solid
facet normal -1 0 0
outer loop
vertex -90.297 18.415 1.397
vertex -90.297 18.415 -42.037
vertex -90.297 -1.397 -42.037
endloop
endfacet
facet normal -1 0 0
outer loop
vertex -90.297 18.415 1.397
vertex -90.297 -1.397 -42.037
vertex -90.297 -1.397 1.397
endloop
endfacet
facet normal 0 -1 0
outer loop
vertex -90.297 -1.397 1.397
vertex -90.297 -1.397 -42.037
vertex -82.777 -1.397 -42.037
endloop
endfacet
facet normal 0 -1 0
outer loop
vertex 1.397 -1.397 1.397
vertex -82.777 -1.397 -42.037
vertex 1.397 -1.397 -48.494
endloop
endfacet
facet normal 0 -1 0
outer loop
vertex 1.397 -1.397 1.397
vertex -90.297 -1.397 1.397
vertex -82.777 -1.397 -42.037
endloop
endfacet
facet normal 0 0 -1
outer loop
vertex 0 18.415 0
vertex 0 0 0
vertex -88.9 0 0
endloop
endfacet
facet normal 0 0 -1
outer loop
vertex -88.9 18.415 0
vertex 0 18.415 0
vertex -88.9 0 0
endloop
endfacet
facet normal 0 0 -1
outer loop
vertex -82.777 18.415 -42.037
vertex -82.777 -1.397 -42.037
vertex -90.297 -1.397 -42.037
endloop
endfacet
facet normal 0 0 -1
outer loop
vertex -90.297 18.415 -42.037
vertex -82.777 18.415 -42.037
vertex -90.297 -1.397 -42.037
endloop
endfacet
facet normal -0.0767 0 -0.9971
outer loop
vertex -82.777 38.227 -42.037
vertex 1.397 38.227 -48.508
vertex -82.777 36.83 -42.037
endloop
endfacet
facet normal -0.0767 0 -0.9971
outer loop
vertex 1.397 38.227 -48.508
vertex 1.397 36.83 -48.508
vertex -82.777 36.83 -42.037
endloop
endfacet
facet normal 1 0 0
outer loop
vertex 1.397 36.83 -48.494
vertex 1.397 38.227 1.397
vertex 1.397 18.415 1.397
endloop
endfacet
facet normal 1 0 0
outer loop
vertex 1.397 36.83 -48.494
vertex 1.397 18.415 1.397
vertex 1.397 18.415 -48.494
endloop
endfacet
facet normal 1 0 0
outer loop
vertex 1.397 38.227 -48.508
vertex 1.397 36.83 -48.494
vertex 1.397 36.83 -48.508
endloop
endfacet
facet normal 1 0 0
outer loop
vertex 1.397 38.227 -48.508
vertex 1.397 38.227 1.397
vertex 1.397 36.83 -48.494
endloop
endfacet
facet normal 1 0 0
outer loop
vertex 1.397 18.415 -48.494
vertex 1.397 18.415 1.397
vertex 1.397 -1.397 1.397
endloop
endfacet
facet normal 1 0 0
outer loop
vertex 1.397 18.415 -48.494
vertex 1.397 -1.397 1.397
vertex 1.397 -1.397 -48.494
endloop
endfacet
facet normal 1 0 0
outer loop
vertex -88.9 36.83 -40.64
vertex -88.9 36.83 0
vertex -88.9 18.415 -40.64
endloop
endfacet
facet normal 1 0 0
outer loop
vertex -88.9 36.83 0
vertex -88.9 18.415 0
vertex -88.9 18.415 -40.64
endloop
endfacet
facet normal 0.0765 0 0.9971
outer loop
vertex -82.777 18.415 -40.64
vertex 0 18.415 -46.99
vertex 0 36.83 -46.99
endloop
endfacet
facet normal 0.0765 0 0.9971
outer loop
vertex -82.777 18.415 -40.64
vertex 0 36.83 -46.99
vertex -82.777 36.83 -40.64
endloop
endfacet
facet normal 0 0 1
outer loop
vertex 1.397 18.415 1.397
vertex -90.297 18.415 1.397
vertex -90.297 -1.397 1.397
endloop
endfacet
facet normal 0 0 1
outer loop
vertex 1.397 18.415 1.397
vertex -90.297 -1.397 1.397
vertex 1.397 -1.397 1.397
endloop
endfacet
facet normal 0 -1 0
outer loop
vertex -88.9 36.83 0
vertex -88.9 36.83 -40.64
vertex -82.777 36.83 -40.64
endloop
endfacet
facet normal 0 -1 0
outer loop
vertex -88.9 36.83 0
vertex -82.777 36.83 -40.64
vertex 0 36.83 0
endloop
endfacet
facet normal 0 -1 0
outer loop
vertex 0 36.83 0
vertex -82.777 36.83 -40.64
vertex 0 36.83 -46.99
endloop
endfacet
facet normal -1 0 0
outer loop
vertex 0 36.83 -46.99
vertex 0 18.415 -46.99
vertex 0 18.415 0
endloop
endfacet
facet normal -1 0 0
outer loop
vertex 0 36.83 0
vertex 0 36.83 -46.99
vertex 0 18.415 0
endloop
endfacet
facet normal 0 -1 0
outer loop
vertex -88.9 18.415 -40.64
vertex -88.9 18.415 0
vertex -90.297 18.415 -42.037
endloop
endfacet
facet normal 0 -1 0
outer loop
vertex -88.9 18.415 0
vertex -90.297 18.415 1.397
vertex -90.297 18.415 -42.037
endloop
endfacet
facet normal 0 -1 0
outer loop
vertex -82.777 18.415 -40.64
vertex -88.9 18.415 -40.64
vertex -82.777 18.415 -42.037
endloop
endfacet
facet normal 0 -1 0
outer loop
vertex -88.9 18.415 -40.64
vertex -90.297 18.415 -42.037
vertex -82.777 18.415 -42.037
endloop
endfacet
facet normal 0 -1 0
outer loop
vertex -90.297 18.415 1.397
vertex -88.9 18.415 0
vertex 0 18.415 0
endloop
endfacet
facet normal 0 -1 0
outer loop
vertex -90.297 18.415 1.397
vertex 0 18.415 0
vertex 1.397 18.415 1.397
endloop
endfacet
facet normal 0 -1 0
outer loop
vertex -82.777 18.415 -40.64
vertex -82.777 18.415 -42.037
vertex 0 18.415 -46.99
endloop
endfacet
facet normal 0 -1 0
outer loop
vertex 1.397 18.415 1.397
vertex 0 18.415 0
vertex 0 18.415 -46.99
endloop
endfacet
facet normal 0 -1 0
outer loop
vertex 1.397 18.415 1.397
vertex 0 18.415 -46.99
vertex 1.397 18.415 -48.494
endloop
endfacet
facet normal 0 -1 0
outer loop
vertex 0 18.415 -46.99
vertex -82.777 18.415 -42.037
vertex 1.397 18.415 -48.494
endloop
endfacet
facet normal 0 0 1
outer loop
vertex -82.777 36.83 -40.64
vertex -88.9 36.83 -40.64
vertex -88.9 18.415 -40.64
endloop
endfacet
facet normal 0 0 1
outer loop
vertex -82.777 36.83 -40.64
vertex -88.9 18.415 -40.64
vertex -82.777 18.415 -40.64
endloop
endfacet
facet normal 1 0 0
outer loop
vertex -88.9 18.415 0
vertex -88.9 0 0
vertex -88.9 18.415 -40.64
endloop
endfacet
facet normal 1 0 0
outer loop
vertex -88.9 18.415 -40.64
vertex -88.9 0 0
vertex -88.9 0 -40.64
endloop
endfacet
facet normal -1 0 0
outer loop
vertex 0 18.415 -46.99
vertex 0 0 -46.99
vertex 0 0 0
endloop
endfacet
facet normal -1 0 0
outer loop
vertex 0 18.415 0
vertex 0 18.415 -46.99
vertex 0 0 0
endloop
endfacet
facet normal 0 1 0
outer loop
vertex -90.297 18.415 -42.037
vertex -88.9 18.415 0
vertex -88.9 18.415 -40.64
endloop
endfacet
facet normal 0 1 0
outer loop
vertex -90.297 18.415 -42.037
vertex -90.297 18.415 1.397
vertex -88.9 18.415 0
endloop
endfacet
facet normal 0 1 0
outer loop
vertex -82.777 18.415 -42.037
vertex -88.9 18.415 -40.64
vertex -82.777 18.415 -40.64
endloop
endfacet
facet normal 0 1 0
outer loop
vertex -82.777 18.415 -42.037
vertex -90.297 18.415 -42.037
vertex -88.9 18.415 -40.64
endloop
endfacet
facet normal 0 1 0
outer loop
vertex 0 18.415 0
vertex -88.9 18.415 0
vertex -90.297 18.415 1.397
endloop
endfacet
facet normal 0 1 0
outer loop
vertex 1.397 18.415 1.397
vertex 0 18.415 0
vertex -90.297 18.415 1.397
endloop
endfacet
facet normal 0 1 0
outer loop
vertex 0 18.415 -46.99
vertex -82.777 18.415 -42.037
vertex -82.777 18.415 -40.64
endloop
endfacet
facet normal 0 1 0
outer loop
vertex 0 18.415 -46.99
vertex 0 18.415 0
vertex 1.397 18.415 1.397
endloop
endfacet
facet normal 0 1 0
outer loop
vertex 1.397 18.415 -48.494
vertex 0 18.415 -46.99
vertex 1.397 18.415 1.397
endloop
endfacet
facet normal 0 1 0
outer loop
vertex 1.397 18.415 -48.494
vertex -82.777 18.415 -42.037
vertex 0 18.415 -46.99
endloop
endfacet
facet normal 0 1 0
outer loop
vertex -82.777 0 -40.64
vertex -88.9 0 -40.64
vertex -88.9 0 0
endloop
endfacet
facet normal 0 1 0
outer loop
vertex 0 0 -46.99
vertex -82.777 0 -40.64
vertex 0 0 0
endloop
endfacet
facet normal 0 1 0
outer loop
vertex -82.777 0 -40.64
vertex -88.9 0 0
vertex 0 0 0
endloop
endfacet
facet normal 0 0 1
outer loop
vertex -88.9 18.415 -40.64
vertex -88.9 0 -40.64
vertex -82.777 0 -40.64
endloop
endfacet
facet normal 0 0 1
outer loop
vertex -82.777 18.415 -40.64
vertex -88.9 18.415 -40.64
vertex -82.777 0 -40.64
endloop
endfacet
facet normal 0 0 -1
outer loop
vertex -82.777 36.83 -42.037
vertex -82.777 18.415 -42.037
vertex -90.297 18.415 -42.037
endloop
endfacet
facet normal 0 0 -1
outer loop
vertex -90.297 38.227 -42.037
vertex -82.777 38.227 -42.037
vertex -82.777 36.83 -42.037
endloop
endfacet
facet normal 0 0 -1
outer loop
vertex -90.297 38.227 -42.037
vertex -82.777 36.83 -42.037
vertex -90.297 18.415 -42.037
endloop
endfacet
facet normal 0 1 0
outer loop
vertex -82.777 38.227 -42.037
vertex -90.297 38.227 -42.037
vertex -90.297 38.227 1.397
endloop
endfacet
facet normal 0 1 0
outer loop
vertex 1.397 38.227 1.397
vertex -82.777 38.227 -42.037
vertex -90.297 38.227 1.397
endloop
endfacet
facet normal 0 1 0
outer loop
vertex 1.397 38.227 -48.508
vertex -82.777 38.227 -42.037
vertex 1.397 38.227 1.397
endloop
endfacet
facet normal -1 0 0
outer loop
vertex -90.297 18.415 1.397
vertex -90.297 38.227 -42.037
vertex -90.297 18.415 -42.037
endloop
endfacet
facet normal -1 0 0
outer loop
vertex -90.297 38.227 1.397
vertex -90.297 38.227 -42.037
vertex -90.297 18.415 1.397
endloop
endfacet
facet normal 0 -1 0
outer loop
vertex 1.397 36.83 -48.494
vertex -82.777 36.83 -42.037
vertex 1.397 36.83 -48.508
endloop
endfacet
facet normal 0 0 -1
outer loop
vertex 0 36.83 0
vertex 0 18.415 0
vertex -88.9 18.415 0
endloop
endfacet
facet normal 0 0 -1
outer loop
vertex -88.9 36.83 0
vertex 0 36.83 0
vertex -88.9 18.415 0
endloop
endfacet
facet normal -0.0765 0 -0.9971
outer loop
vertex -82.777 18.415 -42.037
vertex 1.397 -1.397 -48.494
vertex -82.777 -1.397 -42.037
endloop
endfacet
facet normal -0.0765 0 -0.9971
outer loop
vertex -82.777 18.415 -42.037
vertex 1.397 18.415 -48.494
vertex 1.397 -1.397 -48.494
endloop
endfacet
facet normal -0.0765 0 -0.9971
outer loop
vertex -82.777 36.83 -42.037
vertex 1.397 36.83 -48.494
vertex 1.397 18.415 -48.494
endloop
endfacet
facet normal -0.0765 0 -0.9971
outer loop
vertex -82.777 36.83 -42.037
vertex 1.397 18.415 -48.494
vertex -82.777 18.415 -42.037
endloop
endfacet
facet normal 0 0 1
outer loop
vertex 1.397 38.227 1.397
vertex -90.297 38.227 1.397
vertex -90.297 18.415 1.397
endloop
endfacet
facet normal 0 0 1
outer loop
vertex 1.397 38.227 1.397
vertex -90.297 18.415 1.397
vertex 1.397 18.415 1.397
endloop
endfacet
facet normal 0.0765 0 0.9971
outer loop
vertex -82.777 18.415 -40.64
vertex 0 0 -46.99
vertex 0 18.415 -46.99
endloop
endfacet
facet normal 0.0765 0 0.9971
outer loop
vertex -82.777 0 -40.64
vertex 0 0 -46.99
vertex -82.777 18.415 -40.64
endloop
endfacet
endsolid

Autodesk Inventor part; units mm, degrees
ref_plane "YZ Plane" through (0, 0, 0) normal (1, 0, 0) x (0, 1, 0)
ref_plane "XZ Plane" through (0, 0, 0) normal (0, 1, 0) x (-1, 0, 0)
ref_plane "XY Plane" through (0, 0, 0) normal (0, 0, 1) x (1, 0, 0)
sketch "Sketch1" plane through (0, 0, 0) normal (0, 1, 0) x (-1, 0, 0)
  point P0 (0, 0)
sketch "Sketch2" plane through (0, 0, 0) normal (0, 1, 0) x (-1, 0, 0)
  line L0 (0, 0) -> (88.9, 0)
  line L1 (88.9, 0) -> (88.9, -40.64)
  line L2 (88.9, -40.64) -> (82.7769, -40.64)
  line L3 (0, -40.64) -> (0, 0)
  line L4 (0, -40.64) -> (0, -46.99)
  line L5 (0, -46.99) -> (82.7769, -40.64)
  line L6 (88.9, 1.397) -> (0, 1.397)
  line L7 (0, 1.397) -> (-1.397, 1.397)
  line L8 (-1.397, 1.397) -> (-1.397, -42.037)
  line L9 (-1.397, -42.037) -> (-1.397, -47.0972)
  line L10 (-1.397, -47.0972) -> (-1.397, -48.4942)
  line L11 (-1.397, -48.4942) -> (82.7769, -42.037)
  line L12 (82.7769, -42.037) -> (88.9, -42.037)
  line L13 (88.9, -42.037) -> (90.297, -42.037)
  line L14 (90.297, -42.037) -> (90.297, 1.397)
  line L15 (90.297, 1.397) -> (88.9, 1.397)
  dimension "d0" = 88.9
  dimension "d2" = 6.35
  dimension "d6" = 1.397
  dimension "d7" = 43.434
  dimension "d8" = 1.397
  dimension "d9" = 1.397
extrude "Extrusion1" add sketch "Sketch2" along normal blind 36.83
sketch "Sketch3" plane through (0, 36.83, 0) normal (0, 1, 0) x (1, 0, 0)
  point P0 (0, 0)
sketch "Sketch4" plane through (0, 36.83, 0) normal (0, 1, 0) x (1, 0, 0)
  line L0 (-90.297, -1.397) -> (1.397, -1.397) projected
  line L1 (1.397, -1.397) -> (1.397, 48.5083)
  line L2 (-82.7769, 42.037) -> (-90.297, 42.037) projected
  line L3 (1.397, 48.5083) -> (-82.7769, 42.037)
  line L4 (-82.7769, 42.037) -> (-90.297, 42.037)
  line L5 (-90.297, 42.037) -> (-90.297, -1.397) projected
  line L6 (-90.297, 42.037) -> (-90.297, -1.397)
  line L7 (1.397, -1.397) -> (1.397, 48.4942) projected
  line L8 (-90.297, -1.397) -> (1.397, -1.397)
  line L9 (1.397, -1.397) -> (1.397, 48.4942)
  point P0 (0, 0)
extrude "Extrusion2" add sketch "Sketch4" along normal blind 1.397
sketch "Sketch5" plane through (0, 0, 0) normal (0, -1, 0) x (1, 0, 0)
  line L0 (1.397, -48.4942) -> (-82.7769, -42.037) projected
  line L1 (1.397, -48.4942) -> (-82.7769, -42.037)
  line L2 (-82.7769, -42.037) -> (-90.297, -42.037)
  line L3 (-90.297, 1.397) -> (1.397, 1.397) projected
  line L4 (-90.297, -42.037) -> (-90.297, 1.397)
  line L5 (-90.297, 1.397) -> (1.397, 1.397)
  line L6 (1.397, 1.397) -> (1.397, -48.4942)
  point P0 (0, 0)
extrude "Extrusion3" add sketch "Sketch5" along normal blind 1.397
sketch "Sketch6" plane through (-82.7769, -1.397, -42.037) normal (-0.0764875, 0, -0.9970705) x (-0.9970705, 0, 0.0764875)
  point P0 (-79.3191, 1.397)
sketch "Sketch7" plane through (-90.297, 38.227, 1.397) normal (0, 0, 1) x (1, 0, 0)
  line L0 (0, -39.624) -> (0, 0) projected
  line L1 (0, -19.812) -> (91.694, -19.812)
  line L2 (91.694, -39.624) -> (91.694, 0) projected
  point P0 (90.297, -38.227)
split body "Split1" sketch "Sketch7" result two bodies curves L1 first body at (-26.661, 37.727, -29.7114)
properties part number "EnclosureTop"
